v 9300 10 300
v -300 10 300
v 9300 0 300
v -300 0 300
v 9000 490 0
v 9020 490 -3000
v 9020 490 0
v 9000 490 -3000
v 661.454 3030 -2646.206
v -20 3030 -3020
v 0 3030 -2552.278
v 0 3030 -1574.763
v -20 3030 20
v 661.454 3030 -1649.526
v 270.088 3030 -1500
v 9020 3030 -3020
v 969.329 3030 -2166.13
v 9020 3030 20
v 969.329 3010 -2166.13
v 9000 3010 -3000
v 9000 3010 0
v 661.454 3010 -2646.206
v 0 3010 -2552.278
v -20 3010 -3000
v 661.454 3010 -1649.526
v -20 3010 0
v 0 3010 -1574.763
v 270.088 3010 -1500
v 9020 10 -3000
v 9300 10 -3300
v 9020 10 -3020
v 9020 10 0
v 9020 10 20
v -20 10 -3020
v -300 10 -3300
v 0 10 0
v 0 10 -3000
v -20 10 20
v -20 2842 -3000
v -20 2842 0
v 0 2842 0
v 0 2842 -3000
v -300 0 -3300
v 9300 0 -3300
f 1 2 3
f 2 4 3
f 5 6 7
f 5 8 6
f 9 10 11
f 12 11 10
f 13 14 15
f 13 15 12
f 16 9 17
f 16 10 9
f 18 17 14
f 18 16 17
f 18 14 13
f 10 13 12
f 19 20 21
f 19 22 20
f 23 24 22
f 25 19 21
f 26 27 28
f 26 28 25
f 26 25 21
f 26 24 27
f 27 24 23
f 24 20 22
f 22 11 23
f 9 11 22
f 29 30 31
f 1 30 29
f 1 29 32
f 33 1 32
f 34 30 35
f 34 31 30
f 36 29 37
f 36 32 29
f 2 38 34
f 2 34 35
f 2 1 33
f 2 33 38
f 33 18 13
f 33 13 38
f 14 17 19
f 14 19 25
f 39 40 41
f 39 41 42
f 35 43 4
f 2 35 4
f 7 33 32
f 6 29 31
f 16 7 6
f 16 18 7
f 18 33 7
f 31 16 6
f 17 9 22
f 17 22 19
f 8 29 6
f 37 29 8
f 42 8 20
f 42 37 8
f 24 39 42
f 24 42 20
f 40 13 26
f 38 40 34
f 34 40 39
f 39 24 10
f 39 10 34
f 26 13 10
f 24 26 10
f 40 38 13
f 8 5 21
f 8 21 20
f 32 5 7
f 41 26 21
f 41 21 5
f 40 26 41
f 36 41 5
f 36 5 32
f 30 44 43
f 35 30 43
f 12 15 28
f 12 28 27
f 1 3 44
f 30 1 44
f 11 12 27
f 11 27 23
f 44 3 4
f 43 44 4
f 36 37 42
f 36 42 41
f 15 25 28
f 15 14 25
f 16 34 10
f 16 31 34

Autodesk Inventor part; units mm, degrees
ref_plane "YZ Plane" through (0, 0, 0) normal (1, 0, 0) x (0, 1, 0)
ref_plane "XZ Plane" through (0, 0, 0) normal (0, 1, 0) x (-1, 0, 0)
ref_plane "XY Plane" through (0, 0, 0) normal (0, 0, 1) x (1, 0, 0)
sketch "Sketch1" plane through (0, 0, 0) normal (0, 1, 0) x (-1, 0, 0)
  line L0 (300, 300) -> (-9300, 300)
  line L1 (-9300, 300) -> (-9300, -3300)
  line L2 (-9300, -3300) -> (300, -3300)
  line L3 (300, -3300) -> (300, 300)
  point P0 (0, 0)
  dimension "d0" = 3600
  dimension "d2" = 9600
  dimension "d3" = 300
  dimension "d4" = 300
extrude "Extrusion1" add sketch "Sketch1" along normal blind 10
sketch "Sketch2" plane through (0, 10, 0) normal (0, 1, 0) x (1, 0, 0)
  line L0 (0, 0) -> (9000, 0)
  line L1 (9000, 0) -> (9000, 3000)
  line L2 (9000, 3000) -> (0, 3000)
  line L3 (0, 3000) -> (0, 0)
  line L4 (-20, -20) -> (9020, -20)
  line L5 (9020, -20) -> (9020, 3020)
  line L6 (9020, 3020) -> (-20, 3020)
  line L7 (-20, 3020) -> (-20, -20)
  dimension "d7" = 9000
  dimension "d9" = 3000
  dimension "d10" = 20
  dimension "d11" = 20
  dimension "d12" = 20
  dimension "d13" = 20
extrude "Extrusion2" add sketch "Sketch2" along normal blind 3000
sketch "Sketch3" plane through (9020, 10, 20) normal (1, 0, 0) x (0, 0, -1)
  line L0 (0, 3000) -> (3040, 3000)
  line L1 (3040, 3000) -> (3040, 3020)
  line L2 (3040, 3020) -> (0, 3020)
  line L3 (0, 3020) -> (0, 3000)
  point P0 (20, -10)
  dimension "d16" = 20
extrude "Extrusion3" add sketch "Sketch3" against normal blind 9040
sketch "Sketch4" plane through (9020, 10, 20) normal (1, 0, 0) x (0, 0, -1)
  line L0 (3040, 0) -> (0, 0) projected
  line L1 (0, 0) -> (0, 3020) projected
  line L2 (20, 0) -> (3020, 0)
  line L3 (3020, 0) -> (3020, 480)
  line L4 (3020, 480) -> (20, 480)
  line L5 (20, 480) -> (20, 0)
  point P0 (20, -10)
  dimension "d20" = 20
  dimension "d21" = 480
  dimension "d22" = 3000
extrude "Extrusion4" cut sketch "Sketch4" along normal mid plane 40
sketch "Sketch5" plane through (-20, 10, -3020) normal (-1, 0, 0) x (0, 0, 1)
  line L0 (3040, 3020) -> (0, 3020) projected
  line L1 (0, 0) -> (0, 3020) projected
  line L2 (20, 3000) -> (3020, 3000)
  line L3 (3020, 3000) -> (3020, 2832)
  line L4 (3020, 2832) -> (20, 2832)
  line L5 (20, 2832) -> (20, 3000)
  point P0 (3020, -10)
  dimension "d25" = 20
  dimension "d26" = 20
  dimension "d27" = 168
  dimension "d28" = 3000
extrude "Extrusion5" cut sketch "Sketch5" against normal blind 40
sketch "Sketch7" plane through (9020, 3030, 20) normal (0, 1, 0) x (1, 0, 0)
  line L0 (-9040, 0) -> (-9040, 3040) projected
  line L1 (-9020, 2572.2782) -> (-8358.5458, 2666.2061)
  line L2 (-8358.5458, 2666.2061) -> (-8050.671, 2186.1301)
  line L3 (-8050.671, 2186.1301) -> (-8358.5458, 1669.5265)
  line L4 (-8358.5458, 1669.5265) -> (-8749.9121, 1520)
  line L5 (-8749.9121, 1520) -> (-9020, 1594.7633)
  line L6 (-9020, 1594.7633) -> (-9020, 2572.2782)
  point P0 (-9020, 20)
extrude "Extrusion7" cut sketch "Sketch7" against normal blind 40
properties part number "Restivo_Drawing"
